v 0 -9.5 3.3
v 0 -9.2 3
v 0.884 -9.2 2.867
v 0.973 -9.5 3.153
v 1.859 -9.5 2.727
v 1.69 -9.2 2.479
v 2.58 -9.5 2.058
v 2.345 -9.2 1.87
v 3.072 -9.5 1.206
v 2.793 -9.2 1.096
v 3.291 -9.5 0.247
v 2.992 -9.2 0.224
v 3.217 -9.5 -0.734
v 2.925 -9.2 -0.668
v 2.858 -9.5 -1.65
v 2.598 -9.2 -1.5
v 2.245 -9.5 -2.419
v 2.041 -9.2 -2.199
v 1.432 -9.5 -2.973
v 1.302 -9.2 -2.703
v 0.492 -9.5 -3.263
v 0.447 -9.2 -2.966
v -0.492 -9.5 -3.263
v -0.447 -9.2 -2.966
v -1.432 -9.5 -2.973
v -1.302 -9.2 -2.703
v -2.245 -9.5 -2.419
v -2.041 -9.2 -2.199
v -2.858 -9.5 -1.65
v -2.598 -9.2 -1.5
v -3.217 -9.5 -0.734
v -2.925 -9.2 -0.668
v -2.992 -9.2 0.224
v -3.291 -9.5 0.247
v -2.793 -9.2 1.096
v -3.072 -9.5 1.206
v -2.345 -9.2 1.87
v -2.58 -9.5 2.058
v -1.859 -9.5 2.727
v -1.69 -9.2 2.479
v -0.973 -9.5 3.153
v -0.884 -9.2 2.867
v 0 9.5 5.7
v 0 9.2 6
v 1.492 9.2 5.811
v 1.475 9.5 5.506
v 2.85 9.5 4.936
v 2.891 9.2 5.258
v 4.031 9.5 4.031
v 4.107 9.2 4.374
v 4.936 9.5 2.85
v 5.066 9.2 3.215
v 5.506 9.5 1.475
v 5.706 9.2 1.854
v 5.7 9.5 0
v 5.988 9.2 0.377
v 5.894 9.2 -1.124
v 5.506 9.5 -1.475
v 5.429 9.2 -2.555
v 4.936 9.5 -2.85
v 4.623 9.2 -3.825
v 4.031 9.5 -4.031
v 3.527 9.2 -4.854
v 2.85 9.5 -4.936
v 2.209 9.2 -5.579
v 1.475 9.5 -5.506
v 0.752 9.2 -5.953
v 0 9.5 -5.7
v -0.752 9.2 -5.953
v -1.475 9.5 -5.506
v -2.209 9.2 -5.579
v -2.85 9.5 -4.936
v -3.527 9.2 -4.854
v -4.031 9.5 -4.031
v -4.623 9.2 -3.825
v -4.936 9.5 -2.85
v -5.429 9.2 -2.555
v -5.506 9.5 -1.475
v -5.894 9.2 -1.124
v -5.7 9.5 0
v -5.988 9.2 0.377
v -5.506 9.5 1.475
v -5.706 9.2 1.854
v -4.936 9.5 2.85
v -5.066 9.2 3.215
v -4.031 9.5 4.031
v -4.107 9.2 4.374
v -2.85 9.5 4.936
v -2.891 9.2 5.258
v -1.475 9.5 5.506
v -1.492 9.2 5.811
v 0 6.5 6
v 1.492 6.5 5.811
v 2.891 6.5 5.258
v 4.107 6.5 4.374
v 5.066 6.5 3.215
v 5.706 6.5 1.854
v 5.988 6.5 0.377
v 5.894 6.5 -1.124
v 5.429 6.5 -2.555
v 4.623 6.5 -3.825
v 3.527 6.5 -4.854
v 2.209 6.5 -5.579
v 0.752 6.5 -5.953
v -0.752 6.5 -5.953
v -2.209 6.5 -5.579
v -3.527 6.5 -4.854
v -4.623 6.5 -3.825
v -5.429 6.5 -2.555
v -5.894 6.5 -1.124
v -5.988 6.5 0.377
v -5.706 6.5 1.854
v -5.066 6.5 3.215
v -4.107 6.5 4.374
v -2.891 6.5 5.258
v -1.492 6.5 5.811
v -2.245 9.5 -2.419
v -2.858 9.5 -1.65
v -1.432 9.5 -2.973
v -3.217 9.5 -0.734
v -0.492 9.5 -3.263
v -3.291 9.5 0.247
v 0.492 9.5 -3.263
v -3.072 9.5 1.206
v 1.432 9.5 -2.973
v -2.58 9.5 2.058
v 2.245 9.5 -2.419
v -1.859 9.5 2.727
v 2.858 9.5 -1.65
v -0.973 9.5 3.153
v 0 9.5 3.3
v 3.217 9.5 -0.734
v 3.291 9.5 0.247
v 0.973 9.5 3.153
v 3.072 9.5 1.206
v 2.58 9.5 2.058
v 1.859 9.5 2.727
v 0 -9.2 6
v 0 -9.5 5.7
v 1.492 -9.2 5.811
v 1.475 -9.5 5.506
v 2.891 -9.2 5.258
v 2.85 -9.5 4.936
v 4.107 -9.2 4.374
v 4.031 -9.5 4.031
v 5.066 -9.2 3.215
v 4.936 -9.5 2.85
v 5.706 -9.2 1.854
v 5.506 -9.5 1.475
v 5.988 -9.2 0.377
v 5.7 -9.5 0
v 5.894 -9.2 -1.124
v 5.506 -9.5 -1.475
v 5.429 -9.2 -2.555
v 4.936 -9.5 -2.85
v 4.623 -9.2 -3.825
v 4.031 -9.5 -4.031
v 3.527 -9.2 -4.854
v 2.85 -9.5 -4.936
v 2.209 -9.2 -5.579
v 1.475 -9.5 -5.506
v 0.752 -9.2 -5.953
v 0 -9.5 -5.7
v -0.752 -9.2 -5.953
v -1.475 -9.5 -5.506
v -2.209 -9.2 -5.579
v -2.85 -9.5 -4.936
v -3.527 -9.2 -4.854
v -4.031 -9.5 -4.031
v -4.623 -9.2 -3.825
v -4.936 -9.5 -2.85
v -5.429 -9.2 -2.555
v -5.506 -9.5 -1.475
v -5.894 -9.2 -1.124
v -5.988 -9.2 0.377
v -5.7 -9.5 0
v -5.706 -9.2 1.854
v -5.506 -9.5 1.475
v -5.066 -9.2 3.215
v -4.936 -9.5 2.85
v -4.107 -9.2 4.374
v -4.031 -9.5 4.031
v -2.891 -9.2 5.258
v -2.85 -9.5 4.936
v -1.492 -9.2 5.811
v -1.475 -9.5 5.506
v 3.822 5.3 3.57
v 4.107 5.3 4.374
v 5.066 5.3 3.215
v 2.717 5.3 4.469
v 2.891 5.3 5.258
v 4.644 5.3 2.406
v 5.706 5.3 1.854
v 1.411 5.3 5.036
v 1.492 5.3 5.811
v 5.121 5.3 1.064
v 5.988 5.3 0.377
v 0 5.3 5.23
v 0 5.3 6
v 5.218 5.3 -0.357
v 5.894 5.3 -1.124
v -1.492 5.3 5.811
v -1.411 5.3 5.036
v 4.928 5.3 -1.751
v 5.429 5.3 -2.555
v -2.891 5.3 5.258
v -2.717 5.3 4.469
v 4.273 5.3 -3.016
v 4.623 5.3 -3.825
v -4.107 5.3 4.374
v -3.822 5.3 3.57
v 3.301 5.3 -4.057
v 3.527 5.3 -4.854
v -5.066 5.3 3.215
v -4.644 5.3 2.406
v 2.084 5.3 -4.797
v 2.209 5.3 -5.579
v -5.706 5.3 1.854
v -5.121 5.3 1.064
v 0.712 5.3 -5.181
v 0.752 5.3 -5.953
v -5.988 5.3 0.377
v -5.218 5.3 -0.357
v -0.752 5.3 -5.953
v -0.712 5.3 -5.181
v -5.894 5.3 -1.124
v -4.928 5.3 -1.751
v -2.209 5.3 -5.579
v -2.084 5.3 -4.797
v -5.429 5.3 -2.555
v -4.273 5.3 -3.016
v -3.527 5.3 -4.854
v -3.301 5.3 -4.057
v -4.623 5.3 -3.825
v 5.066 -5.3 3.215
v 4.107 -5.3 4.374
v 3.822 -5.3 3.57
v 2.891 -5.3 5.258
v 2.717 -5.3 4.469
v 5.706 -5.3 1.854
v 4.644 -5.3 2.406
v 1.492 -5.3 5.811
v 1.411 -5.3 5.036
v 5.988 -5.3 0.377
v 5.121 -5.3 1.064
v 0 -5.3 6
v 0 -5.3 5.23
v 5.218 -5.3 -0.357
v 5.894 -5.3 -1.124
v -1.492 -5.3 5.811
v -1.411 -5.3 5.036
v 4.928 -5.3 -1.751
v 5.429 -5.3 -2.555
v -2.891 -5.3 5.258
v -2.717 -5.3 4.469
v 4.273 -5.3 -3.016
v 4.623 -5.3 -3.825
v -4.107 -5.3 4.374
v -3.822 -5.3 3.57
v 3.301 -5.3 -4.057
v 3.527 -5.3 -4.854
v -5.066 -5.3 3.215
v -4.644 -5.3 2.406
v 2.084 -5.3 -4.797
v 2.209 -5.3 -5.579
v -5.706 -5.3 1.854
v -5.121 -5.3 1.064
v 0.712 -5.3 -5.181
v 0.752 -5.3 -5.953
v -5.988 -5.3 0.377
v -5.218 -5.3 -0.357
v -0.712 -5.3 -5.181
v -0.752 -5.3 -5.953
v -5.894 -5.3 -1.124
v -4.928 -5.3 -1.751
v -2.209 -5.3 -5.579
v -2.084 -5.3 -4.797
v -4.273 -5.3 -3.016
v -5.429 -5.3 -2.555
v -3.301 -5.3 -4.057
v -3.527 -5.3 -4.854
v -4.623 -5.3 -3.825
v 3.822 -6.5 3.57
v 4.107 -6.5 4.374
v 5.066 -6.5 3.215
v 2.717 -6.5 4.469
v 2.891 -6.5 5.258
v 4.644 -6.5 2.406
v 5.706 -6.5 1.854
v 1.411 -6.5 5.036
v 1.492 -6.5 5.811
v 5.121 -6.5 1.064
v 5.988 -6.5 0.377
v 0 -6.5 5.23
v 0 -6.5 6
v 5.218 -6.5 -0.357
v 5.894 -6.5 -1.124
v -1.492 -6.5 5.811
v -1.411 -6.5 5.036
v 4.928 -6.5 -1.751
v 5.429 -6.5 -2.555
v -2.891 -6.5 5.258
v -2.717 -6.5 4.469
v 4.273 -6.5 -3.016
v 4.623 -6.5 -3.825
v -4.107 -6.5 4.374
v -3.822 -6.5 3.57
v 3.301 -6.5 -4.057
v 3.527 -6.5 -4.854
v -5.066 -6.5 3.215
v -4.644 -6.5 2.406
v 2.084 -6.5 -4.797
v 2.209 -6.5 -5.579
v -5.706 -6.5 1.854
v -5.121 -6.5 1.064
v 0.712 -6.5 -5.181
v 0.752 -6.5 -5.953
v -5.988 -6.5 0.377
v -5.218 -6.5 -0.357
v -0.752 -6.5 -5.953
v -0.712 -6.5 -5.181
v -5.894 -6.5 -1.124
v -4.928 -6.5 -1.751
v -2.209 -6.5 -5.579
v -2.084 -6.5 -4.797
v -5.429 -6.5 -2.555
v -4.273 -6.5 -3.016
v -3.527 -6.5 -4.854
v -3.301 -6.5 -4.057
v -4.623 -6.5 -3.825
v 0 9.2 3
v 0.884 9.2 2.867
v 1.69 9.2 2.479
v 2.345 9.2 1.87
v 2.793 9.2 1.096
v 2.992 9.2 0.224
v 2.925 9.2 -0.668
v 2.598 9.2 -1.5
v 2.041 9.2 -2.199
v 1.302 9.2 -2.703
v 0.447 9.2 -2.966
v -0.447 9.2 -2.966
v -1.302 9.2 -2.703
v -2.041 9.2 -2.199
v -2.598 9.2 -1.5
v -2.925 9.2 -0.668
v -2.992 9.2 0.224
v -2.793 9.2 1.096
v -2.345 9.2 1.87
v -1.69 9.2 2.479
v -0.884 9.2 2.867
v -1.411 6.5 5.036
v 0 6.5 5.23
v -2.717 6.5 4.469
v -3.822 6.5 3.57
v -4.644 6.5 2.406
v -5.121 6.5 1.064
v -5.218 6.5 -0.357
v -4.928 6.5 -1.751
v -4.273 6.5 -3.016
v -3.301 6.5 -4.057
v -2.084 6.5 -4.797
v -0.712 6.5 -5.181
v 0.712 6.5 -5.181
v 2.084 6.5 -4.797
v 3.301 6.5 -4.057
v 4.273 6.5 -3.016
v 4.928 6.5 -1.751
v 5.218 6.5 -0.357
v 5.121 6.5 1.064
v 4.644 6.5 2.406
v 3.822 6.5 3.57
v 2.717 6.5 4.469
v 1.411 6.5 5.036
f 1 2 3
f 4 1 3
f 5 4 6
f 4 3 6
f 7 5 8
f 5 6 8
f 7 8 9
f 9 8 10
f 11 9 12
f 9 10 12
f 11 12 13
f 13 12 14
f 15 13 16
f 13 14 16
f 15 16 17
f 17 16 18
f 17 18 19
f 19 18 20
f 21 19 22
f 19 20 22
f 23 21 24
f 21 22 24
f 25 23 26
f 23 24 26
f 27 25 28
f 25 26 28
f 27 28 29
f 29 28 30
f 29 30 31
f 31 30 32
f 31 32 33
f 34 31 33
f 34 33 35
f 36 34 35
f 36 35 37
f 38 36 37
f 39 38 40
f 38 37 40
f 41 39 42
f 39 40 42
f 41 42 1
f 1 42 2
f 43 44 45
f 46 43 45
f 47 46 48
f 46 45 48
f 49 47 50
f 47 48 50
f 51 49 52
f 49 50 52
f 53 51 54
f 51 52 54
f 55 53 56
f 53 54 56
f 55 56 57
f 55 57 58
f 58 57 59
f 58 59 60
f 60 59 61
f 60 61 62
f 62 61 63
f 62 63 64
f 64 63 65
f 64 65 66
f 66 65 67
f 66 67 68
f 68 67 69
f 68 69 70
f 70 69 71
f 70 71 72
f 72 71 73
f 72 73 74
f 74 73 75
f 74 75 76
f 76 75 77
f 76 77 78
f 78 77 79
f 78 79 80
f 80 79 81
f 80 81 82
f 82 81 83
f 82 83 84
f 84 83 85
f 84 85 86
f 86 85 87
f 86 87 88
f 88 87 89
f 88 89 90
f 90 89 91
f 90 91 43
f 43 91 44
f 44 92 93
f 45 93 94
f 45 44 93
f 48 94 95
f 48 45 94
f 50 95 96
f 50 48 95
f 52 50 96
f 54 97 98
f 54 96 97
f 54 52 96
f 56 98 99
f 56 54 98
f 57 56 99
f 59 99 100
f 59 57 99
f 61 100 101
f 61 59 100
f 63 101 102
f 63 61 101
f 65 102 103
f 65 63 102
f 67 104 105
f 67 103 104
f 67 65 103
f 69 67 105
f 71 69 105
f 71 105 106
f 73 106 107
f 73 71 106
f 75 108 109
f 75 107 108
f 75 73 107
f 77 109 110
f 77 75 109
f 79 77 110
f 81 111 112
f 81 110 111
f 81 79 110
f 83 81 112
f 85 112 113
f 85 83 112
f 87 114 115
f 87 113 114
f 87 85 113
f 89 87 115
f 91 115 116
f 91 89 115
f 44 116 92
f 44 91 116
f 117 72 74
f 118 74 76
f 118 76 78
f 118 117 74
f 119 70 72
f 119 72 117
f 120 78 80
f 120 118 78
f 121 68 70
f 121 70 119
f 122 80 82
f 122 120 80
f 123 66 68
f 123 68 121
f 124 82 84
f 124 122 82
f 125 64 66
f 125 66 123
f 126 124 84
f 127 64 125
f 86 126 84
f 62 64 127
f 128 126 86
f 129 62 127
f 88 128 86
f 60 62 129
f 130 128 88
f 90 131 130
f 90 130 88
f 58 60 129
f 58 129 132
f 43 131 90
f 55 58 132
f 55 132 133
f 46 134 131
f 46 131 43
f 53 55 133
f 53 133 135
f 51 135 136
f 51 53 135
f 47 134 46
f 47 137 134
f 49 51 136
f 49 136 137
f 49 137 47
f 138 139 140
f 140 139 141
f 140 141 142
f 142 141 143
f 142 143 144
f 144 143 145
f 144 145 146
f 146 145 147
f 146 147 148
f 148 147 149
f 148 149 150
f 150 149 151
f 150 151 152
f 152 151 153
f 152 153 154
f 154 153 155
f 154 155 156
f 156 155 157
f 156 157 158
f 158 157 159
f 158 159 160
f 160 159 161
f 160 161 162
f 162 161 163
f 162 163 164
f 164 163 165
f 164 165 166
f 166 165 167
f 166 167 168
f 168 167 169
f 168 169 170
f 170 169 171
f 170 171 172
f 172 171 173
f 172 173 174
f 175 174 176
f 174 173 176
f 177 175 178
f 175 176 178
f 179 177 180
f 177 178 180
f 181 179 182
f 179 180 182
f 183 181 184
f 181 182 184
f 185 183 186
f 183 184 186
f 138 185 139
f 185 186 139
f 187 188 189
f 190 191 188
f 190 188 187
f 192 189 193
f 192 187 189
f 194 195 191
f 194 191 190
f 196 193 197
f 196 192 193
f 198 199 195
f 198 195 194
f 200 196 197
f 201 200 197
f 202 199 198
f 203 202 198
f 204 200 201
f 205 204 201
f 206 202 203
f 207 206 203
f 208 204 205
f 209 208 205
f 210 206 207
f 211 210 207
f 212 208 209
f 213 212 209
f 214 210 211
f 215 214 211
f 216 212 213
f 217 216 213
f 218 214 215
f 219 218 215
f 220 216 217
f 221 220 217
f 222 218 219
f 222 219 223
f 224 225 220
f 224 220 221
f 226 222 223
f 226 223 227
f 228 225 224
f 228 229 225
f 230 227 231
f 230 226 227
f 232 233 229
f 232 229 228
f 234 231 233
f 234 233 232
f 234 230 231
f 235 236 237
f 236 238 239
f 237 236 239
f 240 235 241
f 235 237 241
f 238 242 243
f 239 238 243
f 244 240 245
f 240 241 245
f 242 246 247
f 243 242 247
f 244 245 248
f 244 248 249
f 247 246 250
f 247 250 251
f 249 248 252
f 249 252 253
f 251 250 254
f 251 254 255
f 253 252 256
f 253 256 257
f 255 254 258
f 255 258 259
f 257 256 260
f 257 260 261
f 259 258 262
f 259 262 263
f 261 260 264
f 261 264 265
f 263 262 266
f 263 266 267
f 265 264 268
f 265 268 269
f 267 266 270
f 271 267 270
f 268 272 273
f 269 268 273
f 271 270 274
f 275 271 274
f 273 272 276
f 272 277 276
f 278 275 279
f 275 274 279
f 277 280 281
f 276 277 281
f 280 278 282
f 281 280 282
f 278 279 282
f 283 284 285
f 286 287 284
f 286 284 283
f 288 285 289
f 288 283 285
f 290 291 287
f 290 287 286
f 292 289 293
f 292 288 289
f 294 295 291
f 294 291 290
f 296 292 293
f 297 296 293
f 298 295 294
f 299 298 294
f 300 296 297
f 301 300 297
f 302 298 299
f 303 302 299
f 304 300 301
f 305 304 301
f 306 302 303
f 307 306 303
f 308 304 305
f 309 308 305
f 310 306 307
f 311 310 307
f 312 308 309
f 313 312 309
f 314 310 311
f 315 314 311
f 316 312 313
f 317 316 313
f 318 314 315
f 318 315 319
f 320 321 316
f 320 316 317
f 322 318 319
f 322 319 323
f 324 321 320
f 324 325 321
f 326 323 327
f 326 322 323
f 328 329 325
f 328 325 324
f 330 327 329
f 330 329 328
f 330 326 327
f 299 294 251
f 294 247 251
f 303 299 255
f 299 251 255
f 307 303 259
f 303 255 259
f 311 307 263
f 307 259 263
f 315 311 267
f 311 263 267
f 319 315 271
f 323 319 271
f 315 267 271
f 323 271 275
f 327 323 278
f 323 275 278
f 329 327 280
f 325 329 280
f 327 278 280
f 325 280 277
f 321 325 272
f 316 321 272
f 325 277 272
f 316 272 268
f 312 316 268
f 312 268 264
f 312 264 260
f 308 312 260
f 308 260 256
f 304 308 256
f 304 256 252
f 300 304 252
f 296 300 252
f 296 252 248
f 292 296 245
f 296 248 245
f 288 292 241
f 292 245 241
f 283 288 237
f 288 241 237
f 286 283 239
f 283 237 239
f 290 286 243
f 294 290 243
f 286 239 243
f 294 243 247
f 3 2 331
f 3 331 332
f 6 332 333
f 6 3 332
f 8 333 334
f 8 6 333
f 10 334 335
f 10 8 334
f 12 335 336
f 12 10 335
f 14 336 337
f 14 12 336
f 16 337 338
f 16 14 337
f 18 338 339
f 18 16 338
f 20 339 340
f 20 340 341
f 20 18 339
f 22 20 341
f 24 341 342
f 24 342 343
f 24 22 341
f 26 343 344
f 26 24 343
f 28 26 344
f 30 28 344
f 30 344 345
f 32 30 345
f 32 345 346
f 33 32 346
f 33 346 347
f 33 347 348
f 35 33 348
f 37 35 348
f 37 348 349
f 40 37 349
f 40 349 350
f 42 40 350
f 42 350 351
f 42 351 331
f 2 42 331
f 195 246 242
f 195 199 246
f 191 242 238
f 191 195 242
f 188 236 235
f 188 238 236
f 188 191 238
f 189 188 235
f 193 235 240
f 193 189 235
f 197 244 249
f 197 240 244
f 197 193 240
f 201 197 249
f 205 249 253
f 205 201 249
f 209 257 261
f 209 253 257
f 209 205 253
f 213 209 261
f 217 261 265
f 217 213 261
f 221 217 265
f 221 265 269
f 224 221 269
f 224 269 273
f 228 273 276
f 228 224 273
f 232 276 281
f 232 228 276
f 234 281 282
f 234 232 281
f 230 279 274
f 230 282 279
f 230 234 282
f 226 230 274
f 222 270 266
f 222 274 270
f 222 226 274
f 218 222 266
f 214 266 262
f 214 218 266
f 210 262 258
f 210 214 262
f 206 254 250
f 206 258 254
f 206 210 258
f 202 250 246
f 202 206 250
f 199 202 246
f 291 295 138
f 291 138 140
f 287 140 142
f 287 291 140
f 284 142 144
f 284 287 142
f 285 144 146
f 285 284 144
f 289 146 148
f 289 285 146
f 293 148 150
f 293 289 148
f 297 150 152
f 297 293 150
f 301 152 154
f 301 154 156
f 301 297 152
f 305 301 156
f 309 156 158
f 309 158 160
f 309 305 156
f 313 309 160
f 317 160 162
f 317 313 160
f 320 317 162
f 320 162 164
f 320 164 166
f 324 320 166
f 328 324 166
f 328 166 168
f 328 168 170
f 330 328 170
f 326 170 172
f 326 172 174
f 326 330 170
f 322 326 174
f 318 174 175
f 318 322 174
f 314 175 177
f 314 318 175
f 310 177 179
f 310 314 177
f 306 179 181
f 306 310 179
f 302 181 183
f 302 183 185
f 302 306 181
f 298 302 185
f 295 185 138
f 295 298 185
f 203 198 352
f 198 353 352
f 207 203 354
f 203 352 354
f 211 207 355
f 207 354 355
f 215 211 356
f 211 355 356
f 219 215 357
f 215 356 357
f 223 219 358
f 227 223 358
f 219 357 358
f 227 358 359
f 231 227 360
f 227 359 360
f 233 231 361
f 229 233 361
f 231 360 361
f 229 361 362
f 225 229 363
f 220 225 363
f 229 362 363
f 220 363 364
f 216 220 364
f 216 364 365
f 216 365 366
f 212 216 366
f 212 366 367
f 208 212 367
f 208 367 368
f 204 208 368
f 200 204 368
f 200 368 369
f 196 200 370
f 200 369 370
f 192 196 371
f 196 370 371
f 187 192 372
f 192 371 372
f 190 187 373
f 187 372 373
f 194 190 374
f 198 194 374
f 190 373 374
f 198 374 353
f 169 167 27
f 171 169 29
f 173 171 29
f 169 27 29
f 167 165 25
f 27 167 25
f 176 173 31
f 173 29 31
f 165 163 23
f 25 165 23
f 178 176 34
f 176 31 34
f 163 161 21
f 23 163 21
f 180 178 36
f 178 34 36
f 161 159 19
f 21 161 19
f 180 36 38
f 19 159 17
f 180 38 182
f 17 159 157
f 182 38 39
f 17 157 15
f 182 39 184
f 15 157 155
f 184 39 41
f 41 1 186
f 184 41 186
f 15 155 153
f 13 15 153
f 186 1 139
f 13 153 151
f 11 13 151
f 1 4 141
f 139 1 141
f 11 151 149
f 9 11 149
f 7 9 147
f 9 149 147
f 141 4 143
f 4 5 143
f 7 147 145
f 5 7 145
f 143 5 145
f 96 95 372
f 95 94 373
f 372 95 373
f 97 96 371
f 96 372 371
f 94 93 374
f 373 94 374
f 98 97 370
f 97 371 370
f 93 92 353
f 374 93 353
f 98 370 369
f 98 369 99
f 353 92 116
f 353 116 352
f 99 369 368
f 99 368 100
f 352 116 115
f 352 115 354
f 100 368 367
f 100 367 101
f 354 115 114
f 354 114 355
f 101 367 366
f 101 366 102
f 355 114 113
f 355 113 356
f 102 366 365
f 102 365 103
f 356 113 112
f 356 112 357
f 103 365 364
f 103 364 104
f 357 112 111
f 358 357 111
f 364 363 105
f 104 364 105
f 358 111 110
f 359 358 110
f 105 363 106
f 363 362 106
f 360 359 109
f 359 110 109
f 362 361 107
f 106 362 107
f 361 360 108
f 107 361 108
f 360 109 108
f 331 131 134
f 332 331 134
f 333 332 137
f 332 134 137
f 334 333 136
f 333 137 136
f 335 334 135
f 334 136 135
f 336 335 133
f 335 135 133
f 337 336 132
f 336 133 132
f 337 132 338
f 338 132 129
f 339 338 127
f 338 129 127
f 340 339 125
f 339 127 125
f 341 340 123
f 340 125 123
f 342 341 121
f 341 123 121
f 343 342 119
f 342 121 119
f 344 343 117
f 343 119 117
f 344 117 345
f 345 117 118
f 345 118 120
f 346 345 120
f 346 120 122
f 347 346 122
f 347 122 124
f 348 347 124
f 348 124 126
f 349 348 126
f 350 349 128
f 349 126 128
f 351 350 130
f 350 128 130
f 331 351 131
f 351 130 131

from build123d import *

# Parameters (mm, degrees)
SKETCH1_R           = 6
SKETCH1_R_2         = 3
BOSS_EXTRUDE1_DEPTH = 9.5
SKETCH2_W           = 0.770034963
SKETCH2_H           = 1.2
CHAMFER1_SIZE       = 0.3


with BuildPart() as part:
    # Sketch1 → Boss-Extrude1 (new, symmetric)
    with BuildSketch(Plane(origin=(0, 0, 0), x_dir=(1, 0, 0), z_dir=(0, 1, 0))):
        with Locations(Location((0, 0, 0), (0, 0, 270))):
            Circle(SKETCH1_R)
        with Locations(Location((0, 0, 0), (0, 0, 270))):
            Circle(SKETCH1_R_2, mode=Mode.SUBTRACT)
    extrude(amount=BOSS_EXTRUDE1_DEPTH, both=True)

    # Sketch2 → Cut-Revolve1 (revolve, cut)
    with BuildSketch(Plane(origin=(0, 0, 0), x_dir=(0, 0, -1), z_dir=(1, 0, 0)), mode=Mode.PRIVATE) as cut_revolve1_sk:
        with Locations((5.614982518, 5.9)):
            Rectangle(SKETCH2_W, SKETCH2_H)
        with Locations((5.614982518, -5.9)):
            Rectangle(SKETCH2_W, SKETCH2_H)
    revolve(cut_revolve1_sk.sketch.rotate(Axis((0, 9.5, 0), (0, -1, 0)), 180), axis=Axis((0, 9.5, 0), (0, -1, 0)), mode=Mode.SUBTRACT)

    # Chamfer1
    chamfer1_edges = [part.edges().sort_by_distance(p)[0] for p in [
        (0, -9.5, -6),
        (0, 9.5, -6),
        (0, -9.5, -3),
        (0, 9.5, -3),
    ]]
    chamfer(chamfer1_edges, length=CHAMFER1_SIZE)


solid = part.part
